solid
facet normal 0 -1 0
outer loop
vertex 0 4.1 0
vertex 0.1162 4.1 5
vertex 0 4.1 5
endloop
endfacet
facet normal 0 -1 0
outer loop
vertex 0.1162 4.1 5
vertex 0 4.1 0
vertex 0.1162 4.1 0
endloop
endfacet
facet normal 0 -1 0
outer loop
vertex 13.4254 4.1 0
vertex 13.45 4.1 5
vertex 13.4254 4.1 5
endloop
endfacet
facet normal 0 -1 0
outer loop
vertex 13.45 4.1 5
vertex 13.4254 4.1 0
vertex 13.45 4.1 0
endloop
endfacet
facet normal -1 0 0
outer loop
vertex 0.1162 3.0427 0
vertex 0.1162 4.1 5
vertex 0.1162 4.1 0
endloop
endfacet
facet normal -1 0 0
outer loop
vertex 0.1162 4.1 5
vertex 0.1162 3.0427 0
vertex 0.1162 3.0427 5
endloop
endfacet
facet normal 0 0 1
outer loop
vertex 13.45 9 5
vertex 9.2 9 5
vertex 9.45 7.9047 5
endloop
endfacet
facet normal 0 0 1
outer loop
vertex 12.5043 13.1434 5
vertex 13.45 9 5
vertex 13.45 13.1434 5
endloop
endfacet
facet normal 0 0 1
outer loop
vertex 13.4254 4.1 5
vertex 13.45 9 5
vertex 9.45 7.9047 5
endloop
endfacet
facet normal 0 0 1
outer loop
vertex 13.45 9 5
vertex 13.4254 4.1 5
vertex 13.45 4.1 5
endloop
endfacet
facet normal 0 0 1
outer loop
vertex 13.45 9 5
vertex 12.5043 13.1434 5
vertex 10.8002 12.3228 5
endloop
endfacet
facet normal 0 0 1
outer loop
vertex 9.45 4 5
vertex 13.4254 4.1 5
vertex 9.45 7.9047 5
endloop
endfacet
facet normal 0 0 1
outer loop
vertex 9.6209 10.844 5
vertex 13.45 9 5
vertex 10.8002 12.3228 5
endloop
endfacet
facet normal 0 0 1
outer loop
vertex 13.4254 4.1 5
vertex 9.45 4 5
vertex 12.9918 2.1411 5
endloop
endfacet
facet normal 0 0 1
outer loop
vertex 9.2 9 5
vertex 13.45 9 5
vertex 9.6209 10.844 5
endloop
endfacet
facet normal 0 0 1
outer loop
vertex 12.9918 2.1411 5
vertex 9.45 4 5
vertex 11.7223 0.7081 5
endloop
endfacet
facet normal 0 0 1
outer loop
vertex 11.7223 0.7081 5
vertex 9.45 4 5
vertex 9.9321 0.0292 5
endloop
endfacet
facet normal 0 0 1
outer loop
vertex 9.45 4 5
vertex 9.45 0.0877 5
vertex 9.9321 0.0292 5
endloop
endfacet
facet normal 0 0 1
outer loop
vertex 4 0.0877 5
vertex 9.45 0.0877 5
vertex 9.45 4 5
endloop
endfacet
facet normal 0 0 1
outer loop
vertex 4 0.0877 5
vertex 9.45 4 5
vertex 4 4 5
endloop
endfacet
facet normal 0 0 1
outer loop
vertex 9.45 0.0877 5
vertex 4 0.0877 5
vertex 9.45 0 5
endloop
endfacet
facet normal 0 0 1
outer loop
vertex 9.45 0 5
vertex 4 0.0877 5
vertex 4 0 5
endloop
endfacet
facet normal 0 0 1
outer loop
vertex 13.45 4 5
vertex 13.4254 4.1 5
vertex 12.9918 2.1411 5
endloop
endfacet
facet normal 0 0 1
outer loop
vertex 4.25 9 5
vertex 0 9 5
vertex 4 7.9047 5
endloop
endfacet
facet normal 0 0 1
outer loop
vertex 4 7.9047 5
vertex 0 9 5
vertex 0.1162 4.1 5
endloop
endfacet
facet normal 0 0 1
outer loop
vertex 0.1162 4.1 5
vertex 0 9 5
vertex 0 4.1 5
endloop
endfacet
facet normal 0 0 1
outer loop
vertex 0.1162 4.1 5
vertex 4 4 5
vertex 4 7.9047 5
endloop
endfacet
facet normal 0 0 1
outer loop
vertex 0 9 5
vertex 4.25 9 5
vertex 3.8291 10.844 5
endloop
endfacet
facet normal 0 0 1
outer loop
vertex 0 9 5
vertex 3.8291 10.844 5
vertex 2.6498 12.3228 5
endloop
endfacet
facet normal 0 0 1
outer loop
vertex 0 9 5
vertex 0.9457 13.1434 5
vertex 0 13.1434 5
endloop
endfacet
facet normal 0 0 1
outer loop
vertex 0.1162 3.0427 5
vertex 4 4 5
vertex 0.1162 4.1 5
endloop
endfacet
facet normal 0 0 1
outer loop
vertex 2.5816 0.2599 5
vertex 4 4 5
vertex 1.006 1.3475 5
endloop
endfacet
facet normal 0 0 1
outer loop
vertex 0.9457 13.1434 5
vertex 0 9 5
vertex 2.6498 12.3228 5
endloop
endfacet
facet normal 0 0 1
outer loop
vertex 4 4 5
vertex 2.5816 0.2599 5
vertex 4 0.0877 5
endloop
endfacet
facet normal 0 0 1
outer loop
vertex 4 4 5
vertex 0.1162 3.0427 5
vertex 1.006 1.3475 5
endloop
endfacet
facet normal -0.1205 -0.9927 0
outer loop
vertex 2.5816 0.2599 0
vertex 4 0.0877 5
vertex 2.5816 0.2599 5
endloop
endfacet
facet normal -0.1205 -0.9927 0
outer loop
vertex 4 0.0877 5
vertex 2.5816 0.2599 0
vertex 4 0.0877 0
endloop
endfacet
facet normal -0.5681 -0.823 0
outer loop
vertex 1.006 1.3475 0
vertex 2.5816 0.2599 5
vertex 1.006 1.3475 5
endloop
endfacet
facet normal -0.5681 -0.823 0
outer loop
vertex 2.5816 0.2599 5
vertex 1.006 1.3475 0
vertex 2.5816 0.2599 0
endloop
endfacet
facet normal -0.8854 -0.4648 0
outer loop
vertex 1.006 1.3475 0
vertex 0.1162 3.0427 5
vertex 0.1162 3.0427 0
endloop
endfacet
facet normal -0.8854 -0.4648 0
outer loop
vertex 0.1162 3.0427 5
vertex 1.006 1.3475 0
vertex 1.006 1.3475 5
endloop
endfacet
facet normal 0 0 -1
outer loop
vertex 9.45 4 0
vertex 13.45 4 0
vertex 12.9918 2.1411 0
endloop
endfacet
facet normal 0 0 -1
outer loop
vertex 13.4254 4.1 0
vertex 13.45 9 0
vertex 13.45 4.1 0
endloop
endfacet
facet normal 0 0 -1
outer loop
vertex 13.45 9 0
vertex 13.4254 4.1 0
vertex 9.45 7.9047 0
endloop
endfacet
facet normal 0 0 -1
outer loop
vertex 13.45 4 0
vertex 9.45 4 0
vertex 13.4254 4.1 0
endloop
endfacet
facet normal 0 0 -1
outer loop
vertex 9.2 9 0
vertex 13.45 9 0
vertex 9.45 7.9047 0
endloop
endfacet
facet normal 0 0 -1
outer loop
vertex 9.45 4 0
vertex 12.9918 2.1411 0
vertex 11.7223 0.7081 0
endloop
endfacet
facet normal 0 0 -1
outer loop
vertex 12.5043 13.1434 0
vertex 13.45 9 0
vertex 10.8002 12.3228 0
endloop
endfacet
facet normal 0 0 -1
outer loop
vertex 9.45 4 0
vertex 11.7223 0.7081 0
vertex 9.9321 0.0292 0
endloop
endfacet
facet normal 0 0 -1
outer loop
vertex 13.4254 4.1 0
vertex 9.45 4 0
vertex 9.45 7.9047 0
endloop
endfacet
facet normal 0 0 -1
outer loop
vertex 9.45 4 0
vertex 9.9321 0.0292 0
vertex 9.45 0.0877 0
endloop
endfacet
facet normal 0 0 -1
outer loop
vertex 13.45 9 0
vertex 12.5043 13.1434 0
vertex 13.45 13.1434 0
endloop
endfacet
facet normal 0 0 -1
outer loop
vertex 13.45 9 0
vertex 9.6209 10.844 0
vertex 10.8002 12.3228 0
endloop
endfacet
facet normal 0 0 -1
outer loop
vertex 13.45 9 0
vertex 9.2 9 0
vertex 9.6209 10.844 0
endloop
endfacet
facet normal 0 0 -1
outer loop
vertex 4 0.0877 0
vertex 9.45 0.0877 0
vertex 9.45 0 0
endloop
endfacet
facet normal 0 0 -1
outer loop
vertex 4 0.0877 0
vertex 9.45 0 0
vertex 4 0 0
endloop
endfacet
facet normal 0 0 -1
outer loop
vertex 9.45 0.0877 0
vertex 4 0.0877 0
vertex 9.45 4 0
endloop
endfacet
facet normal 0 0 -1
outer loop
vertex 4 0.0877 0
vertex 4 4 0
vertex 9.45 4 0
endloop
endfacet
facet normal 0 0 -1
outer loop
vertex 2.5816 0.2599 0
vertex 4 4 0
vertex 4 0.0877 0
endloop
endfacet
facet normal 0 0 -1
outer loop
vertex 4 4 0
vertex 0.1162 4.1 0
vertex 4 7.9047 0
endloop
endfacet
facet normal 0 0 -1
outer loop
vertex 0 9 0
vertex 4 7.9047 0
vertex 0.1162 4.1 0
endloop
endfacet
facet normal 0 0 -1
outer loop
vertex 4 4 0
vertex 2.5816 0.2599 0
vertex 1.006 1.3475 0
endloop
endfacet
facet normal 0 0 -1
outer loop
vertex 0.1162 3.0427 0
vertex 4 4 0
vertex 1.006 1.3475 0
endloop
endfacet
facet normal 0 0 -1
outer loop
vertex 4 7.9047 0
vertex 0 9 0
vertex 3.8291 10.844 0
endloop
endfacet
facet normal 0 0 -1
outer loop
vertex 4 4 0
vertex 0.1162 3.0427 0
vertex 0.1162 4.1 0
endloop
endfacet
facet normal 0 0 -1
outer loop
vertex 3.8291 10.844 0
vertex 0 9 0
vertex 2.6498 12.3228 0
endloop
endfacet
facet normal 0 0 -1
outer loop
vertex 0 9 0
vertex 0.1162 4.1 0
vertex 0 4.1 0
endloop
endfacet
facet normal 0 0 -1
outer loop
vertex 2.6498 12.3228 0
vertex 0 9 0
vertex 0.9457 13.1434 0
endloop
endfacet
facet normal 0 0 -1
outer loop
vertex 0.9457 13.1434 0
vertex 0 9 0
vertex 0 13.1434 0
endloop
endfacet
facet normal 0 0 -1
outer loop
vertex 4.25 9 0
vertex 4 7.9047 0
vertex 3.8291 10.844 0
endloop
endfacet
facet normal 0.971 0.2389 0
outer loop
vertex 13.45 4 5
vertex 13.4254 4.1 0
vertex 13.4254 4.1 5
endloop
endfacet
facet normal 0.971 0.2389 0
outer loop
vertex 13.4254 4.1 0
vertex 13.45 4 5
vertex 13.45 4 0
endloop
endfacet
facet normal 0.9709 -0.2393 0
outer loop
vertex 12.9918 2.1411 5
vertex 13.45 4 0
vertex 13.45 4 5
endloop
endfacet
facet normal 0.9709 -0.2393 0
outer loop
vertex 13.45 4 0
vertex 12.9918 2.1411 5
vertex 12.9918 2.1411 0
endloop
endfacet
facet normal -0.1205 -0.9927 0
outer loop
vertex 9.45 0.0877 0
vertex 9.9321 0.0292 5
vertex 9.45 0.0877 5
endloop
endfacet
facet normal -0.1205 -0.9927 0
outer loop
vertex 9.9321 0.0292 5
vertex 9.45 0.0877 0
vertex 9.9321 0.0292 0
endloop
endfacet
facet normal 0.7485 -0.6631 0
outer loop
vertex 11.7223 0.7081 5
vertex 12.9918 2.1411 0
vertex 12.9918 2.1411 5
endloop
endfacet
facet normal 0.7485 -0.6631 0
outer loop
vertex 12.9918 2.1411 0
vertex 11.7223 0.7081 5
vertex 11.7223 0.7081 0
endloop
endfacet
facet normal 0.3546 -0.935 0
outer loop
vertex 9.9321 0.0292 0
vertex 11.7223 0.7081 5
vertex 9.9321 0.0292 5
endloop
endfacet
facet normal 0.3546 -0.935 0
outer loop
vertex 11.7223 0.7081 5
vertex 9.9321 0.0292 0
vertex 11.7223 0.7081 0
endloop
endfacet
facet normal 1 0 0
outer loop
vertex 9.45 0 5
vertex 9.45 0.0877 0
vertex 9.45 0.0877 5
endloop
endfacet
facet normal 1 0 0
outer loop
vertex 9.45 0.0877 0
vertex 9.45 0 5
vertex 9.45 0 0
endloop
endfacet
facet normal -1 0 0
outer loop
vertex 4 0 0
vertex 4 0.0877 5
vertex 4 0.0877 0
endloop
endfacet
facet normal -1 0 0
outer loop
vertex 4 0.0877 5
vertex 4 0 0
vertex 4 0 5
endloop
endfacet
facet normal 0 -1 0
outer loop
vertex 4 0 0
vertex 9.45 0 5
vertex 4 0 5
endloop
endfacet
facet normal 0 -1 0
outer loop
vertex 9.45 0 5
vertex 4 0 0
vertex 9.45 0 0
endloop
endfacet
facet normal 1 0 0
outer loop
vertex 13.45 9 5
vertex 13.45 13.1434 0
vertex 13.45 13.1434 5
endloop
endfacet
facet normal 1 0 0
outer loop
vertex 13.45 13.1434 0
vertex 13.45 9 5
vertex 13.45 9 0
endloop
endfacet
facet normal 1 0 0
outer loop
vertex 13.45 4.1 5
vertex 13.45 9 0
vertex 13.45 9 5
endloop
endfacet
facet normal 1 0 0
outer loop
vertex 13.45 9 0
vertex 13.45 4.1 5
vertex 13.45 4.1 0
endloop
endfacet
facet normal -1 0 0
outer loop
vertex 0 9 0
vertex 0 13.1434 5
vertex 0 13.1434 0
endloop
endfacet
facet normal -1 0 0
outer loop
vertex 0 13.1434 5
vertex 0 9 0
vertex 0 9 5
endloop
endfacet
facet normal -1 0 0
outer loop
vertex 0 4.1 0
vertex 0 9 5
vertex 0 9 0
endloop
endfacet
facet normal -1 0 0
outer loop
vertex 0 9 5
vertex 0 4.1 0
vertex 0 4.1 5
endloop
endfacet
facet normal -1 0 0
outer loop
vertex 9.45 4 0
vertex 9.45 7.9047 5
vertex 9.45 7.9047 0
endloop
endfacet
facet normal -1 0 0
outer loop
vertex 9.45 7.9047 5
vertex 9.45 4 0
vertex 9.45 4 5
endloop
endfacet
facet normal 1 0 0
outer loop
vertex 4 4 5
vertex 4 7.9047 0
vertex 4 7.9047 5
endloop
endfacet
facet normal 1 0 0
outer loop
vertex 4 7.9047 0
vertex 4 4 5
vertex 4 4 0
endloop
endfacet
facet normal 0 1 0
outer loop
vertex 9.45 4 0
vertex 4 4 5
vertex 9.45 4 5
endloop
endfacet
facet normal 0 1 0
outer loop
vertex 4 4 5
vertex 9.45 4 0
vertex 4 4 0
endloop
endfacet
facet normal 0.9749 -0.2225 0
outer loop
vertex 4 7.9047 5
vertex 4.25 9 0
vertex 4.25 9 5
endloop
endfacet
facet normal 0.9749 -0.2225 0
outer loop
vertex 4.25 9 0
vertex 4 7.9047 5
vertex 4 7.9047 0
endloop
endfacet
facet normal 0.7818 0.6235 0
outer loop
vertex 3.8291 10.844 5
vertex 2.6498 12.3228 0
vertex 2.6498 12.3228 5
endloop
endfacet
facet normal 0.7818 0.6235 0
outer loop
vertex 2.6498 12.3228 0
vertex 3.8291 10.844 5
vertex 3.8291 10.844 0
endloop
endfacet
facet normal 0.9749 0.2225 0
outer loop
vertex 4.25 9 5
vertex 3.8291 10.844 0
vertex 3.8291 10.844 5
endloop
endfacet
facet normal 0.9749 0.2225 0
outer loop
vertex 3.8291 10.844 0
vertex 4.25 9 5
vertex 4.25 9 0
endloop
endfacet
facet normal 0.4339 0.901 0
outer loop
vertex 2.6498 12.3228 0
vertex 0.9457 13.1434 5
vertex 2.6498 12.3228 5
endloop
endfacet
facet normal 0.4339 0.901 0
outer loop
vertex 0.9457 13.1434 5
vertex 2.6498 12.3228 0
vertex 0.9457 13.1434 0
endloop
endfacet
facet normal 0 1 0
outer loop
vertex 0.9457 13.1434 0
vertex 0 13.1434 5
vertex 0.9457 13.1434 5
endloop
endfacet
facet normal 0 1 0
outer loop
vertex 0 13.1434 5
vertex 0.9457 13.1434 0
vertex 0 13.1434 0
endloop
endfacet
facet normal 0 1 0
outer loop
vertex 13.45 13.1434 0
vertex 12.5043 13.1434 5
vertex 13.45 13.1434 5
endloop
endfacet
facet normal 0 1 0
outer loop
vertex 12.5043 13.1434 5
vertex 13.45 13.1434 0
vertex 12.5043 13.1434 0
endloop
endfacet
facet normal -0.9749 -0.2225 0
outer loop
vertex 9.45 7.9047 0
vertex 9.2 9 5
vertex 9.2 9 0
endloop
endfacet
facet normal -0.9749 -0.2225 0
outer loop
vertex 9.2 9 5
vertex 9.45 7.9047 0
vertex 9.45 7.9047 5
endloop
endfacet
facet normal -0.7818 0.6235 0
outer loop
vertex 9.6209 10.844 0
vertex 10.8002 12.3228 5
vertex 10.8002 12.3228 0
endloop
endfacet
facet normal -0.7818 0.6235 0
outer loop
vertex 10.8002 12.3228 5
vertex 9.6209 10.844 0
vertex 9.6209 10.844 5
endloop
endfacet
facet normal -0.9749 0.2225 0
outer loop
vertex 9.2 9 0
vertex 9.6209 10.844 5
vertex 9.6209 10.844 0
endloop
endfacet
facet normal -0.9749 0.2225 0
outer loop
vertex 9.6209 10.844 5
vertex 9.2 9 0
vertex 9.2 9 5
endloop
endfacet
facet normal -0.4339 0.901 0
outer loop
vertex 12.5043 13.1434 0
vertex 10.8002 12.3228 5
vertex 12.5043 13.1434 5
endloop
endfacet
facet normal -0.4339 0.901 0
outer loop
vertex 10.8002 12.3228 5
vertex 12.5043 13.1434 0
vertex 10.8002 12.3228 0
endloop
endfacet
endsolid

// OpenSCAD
// [FL_INDEX: keywords="openscad, 3d_parametric, Glass_Plate_clips_parametric-now_customizable, csg_solid" | COT="Parametric OpenSCAD design from 3DCodeverse"]
// Title: Glass Plate clips parametric-now customizable

bed_thick=3.2;				//thickness of bed plate to clamp glass onto
glass_thick=2.25;		//thickness of glass plate to be clamped
width=5;					//how wide the clip will be
clip_thick=4;				//thickness of the clip bars
depth=5;					//how deep the clip will go onto the glass
nub=.25;					//how much the nubs should be smaller than the bed-glass combo for a tight fit


union(){
	difference(){
		cube([bed_thick+glass_thick+2*clip_thick,depth+clip_thick,width]);
		translate([clip_thick,clip_thick,-0.1])
			cube([bed_thick+glass_thick,depth+0.1,width+0.2]);
		difference(){
			translate([-0.1,-0.1,-0.1])
				cube([bed_thick+glass_thick+2*clip_thick+0.2,clip_thick+0.2,width+0.2]);
			translate([clip_thick,clip_thick,0])
				cylinder(h=width,r=clip_thick);
			translate([clip_thick+glass_thick+bed_thick,clip_thick,0])
				cylinder(h=width,r=clip_thick);
			translate([clip_thick,0,-0.1])
				cube([glass_thick+bed_thick,clip_thick,width+0.2]);
		}
	}
	difference(){
		translate([0,clip_thick+depth,0])
			cylinder(h=width,r=clip_thick+nub);
		translate([-clip_thick-nub,0,-0.1])
			cube([clip_thick+nub,100,width+0.2]);
	}
	difference(){
		translate([bed_thick+glass_thick+2*clip_thick,clip_thick+depth,0])
			cylinder(h=width,r=clip_thick+nub);
		translate([bed_thick+glass_thick+2*clip_thick,0,-0.1])
			cube([clip_thick+nub,100,width+0.2]);
	}

}
